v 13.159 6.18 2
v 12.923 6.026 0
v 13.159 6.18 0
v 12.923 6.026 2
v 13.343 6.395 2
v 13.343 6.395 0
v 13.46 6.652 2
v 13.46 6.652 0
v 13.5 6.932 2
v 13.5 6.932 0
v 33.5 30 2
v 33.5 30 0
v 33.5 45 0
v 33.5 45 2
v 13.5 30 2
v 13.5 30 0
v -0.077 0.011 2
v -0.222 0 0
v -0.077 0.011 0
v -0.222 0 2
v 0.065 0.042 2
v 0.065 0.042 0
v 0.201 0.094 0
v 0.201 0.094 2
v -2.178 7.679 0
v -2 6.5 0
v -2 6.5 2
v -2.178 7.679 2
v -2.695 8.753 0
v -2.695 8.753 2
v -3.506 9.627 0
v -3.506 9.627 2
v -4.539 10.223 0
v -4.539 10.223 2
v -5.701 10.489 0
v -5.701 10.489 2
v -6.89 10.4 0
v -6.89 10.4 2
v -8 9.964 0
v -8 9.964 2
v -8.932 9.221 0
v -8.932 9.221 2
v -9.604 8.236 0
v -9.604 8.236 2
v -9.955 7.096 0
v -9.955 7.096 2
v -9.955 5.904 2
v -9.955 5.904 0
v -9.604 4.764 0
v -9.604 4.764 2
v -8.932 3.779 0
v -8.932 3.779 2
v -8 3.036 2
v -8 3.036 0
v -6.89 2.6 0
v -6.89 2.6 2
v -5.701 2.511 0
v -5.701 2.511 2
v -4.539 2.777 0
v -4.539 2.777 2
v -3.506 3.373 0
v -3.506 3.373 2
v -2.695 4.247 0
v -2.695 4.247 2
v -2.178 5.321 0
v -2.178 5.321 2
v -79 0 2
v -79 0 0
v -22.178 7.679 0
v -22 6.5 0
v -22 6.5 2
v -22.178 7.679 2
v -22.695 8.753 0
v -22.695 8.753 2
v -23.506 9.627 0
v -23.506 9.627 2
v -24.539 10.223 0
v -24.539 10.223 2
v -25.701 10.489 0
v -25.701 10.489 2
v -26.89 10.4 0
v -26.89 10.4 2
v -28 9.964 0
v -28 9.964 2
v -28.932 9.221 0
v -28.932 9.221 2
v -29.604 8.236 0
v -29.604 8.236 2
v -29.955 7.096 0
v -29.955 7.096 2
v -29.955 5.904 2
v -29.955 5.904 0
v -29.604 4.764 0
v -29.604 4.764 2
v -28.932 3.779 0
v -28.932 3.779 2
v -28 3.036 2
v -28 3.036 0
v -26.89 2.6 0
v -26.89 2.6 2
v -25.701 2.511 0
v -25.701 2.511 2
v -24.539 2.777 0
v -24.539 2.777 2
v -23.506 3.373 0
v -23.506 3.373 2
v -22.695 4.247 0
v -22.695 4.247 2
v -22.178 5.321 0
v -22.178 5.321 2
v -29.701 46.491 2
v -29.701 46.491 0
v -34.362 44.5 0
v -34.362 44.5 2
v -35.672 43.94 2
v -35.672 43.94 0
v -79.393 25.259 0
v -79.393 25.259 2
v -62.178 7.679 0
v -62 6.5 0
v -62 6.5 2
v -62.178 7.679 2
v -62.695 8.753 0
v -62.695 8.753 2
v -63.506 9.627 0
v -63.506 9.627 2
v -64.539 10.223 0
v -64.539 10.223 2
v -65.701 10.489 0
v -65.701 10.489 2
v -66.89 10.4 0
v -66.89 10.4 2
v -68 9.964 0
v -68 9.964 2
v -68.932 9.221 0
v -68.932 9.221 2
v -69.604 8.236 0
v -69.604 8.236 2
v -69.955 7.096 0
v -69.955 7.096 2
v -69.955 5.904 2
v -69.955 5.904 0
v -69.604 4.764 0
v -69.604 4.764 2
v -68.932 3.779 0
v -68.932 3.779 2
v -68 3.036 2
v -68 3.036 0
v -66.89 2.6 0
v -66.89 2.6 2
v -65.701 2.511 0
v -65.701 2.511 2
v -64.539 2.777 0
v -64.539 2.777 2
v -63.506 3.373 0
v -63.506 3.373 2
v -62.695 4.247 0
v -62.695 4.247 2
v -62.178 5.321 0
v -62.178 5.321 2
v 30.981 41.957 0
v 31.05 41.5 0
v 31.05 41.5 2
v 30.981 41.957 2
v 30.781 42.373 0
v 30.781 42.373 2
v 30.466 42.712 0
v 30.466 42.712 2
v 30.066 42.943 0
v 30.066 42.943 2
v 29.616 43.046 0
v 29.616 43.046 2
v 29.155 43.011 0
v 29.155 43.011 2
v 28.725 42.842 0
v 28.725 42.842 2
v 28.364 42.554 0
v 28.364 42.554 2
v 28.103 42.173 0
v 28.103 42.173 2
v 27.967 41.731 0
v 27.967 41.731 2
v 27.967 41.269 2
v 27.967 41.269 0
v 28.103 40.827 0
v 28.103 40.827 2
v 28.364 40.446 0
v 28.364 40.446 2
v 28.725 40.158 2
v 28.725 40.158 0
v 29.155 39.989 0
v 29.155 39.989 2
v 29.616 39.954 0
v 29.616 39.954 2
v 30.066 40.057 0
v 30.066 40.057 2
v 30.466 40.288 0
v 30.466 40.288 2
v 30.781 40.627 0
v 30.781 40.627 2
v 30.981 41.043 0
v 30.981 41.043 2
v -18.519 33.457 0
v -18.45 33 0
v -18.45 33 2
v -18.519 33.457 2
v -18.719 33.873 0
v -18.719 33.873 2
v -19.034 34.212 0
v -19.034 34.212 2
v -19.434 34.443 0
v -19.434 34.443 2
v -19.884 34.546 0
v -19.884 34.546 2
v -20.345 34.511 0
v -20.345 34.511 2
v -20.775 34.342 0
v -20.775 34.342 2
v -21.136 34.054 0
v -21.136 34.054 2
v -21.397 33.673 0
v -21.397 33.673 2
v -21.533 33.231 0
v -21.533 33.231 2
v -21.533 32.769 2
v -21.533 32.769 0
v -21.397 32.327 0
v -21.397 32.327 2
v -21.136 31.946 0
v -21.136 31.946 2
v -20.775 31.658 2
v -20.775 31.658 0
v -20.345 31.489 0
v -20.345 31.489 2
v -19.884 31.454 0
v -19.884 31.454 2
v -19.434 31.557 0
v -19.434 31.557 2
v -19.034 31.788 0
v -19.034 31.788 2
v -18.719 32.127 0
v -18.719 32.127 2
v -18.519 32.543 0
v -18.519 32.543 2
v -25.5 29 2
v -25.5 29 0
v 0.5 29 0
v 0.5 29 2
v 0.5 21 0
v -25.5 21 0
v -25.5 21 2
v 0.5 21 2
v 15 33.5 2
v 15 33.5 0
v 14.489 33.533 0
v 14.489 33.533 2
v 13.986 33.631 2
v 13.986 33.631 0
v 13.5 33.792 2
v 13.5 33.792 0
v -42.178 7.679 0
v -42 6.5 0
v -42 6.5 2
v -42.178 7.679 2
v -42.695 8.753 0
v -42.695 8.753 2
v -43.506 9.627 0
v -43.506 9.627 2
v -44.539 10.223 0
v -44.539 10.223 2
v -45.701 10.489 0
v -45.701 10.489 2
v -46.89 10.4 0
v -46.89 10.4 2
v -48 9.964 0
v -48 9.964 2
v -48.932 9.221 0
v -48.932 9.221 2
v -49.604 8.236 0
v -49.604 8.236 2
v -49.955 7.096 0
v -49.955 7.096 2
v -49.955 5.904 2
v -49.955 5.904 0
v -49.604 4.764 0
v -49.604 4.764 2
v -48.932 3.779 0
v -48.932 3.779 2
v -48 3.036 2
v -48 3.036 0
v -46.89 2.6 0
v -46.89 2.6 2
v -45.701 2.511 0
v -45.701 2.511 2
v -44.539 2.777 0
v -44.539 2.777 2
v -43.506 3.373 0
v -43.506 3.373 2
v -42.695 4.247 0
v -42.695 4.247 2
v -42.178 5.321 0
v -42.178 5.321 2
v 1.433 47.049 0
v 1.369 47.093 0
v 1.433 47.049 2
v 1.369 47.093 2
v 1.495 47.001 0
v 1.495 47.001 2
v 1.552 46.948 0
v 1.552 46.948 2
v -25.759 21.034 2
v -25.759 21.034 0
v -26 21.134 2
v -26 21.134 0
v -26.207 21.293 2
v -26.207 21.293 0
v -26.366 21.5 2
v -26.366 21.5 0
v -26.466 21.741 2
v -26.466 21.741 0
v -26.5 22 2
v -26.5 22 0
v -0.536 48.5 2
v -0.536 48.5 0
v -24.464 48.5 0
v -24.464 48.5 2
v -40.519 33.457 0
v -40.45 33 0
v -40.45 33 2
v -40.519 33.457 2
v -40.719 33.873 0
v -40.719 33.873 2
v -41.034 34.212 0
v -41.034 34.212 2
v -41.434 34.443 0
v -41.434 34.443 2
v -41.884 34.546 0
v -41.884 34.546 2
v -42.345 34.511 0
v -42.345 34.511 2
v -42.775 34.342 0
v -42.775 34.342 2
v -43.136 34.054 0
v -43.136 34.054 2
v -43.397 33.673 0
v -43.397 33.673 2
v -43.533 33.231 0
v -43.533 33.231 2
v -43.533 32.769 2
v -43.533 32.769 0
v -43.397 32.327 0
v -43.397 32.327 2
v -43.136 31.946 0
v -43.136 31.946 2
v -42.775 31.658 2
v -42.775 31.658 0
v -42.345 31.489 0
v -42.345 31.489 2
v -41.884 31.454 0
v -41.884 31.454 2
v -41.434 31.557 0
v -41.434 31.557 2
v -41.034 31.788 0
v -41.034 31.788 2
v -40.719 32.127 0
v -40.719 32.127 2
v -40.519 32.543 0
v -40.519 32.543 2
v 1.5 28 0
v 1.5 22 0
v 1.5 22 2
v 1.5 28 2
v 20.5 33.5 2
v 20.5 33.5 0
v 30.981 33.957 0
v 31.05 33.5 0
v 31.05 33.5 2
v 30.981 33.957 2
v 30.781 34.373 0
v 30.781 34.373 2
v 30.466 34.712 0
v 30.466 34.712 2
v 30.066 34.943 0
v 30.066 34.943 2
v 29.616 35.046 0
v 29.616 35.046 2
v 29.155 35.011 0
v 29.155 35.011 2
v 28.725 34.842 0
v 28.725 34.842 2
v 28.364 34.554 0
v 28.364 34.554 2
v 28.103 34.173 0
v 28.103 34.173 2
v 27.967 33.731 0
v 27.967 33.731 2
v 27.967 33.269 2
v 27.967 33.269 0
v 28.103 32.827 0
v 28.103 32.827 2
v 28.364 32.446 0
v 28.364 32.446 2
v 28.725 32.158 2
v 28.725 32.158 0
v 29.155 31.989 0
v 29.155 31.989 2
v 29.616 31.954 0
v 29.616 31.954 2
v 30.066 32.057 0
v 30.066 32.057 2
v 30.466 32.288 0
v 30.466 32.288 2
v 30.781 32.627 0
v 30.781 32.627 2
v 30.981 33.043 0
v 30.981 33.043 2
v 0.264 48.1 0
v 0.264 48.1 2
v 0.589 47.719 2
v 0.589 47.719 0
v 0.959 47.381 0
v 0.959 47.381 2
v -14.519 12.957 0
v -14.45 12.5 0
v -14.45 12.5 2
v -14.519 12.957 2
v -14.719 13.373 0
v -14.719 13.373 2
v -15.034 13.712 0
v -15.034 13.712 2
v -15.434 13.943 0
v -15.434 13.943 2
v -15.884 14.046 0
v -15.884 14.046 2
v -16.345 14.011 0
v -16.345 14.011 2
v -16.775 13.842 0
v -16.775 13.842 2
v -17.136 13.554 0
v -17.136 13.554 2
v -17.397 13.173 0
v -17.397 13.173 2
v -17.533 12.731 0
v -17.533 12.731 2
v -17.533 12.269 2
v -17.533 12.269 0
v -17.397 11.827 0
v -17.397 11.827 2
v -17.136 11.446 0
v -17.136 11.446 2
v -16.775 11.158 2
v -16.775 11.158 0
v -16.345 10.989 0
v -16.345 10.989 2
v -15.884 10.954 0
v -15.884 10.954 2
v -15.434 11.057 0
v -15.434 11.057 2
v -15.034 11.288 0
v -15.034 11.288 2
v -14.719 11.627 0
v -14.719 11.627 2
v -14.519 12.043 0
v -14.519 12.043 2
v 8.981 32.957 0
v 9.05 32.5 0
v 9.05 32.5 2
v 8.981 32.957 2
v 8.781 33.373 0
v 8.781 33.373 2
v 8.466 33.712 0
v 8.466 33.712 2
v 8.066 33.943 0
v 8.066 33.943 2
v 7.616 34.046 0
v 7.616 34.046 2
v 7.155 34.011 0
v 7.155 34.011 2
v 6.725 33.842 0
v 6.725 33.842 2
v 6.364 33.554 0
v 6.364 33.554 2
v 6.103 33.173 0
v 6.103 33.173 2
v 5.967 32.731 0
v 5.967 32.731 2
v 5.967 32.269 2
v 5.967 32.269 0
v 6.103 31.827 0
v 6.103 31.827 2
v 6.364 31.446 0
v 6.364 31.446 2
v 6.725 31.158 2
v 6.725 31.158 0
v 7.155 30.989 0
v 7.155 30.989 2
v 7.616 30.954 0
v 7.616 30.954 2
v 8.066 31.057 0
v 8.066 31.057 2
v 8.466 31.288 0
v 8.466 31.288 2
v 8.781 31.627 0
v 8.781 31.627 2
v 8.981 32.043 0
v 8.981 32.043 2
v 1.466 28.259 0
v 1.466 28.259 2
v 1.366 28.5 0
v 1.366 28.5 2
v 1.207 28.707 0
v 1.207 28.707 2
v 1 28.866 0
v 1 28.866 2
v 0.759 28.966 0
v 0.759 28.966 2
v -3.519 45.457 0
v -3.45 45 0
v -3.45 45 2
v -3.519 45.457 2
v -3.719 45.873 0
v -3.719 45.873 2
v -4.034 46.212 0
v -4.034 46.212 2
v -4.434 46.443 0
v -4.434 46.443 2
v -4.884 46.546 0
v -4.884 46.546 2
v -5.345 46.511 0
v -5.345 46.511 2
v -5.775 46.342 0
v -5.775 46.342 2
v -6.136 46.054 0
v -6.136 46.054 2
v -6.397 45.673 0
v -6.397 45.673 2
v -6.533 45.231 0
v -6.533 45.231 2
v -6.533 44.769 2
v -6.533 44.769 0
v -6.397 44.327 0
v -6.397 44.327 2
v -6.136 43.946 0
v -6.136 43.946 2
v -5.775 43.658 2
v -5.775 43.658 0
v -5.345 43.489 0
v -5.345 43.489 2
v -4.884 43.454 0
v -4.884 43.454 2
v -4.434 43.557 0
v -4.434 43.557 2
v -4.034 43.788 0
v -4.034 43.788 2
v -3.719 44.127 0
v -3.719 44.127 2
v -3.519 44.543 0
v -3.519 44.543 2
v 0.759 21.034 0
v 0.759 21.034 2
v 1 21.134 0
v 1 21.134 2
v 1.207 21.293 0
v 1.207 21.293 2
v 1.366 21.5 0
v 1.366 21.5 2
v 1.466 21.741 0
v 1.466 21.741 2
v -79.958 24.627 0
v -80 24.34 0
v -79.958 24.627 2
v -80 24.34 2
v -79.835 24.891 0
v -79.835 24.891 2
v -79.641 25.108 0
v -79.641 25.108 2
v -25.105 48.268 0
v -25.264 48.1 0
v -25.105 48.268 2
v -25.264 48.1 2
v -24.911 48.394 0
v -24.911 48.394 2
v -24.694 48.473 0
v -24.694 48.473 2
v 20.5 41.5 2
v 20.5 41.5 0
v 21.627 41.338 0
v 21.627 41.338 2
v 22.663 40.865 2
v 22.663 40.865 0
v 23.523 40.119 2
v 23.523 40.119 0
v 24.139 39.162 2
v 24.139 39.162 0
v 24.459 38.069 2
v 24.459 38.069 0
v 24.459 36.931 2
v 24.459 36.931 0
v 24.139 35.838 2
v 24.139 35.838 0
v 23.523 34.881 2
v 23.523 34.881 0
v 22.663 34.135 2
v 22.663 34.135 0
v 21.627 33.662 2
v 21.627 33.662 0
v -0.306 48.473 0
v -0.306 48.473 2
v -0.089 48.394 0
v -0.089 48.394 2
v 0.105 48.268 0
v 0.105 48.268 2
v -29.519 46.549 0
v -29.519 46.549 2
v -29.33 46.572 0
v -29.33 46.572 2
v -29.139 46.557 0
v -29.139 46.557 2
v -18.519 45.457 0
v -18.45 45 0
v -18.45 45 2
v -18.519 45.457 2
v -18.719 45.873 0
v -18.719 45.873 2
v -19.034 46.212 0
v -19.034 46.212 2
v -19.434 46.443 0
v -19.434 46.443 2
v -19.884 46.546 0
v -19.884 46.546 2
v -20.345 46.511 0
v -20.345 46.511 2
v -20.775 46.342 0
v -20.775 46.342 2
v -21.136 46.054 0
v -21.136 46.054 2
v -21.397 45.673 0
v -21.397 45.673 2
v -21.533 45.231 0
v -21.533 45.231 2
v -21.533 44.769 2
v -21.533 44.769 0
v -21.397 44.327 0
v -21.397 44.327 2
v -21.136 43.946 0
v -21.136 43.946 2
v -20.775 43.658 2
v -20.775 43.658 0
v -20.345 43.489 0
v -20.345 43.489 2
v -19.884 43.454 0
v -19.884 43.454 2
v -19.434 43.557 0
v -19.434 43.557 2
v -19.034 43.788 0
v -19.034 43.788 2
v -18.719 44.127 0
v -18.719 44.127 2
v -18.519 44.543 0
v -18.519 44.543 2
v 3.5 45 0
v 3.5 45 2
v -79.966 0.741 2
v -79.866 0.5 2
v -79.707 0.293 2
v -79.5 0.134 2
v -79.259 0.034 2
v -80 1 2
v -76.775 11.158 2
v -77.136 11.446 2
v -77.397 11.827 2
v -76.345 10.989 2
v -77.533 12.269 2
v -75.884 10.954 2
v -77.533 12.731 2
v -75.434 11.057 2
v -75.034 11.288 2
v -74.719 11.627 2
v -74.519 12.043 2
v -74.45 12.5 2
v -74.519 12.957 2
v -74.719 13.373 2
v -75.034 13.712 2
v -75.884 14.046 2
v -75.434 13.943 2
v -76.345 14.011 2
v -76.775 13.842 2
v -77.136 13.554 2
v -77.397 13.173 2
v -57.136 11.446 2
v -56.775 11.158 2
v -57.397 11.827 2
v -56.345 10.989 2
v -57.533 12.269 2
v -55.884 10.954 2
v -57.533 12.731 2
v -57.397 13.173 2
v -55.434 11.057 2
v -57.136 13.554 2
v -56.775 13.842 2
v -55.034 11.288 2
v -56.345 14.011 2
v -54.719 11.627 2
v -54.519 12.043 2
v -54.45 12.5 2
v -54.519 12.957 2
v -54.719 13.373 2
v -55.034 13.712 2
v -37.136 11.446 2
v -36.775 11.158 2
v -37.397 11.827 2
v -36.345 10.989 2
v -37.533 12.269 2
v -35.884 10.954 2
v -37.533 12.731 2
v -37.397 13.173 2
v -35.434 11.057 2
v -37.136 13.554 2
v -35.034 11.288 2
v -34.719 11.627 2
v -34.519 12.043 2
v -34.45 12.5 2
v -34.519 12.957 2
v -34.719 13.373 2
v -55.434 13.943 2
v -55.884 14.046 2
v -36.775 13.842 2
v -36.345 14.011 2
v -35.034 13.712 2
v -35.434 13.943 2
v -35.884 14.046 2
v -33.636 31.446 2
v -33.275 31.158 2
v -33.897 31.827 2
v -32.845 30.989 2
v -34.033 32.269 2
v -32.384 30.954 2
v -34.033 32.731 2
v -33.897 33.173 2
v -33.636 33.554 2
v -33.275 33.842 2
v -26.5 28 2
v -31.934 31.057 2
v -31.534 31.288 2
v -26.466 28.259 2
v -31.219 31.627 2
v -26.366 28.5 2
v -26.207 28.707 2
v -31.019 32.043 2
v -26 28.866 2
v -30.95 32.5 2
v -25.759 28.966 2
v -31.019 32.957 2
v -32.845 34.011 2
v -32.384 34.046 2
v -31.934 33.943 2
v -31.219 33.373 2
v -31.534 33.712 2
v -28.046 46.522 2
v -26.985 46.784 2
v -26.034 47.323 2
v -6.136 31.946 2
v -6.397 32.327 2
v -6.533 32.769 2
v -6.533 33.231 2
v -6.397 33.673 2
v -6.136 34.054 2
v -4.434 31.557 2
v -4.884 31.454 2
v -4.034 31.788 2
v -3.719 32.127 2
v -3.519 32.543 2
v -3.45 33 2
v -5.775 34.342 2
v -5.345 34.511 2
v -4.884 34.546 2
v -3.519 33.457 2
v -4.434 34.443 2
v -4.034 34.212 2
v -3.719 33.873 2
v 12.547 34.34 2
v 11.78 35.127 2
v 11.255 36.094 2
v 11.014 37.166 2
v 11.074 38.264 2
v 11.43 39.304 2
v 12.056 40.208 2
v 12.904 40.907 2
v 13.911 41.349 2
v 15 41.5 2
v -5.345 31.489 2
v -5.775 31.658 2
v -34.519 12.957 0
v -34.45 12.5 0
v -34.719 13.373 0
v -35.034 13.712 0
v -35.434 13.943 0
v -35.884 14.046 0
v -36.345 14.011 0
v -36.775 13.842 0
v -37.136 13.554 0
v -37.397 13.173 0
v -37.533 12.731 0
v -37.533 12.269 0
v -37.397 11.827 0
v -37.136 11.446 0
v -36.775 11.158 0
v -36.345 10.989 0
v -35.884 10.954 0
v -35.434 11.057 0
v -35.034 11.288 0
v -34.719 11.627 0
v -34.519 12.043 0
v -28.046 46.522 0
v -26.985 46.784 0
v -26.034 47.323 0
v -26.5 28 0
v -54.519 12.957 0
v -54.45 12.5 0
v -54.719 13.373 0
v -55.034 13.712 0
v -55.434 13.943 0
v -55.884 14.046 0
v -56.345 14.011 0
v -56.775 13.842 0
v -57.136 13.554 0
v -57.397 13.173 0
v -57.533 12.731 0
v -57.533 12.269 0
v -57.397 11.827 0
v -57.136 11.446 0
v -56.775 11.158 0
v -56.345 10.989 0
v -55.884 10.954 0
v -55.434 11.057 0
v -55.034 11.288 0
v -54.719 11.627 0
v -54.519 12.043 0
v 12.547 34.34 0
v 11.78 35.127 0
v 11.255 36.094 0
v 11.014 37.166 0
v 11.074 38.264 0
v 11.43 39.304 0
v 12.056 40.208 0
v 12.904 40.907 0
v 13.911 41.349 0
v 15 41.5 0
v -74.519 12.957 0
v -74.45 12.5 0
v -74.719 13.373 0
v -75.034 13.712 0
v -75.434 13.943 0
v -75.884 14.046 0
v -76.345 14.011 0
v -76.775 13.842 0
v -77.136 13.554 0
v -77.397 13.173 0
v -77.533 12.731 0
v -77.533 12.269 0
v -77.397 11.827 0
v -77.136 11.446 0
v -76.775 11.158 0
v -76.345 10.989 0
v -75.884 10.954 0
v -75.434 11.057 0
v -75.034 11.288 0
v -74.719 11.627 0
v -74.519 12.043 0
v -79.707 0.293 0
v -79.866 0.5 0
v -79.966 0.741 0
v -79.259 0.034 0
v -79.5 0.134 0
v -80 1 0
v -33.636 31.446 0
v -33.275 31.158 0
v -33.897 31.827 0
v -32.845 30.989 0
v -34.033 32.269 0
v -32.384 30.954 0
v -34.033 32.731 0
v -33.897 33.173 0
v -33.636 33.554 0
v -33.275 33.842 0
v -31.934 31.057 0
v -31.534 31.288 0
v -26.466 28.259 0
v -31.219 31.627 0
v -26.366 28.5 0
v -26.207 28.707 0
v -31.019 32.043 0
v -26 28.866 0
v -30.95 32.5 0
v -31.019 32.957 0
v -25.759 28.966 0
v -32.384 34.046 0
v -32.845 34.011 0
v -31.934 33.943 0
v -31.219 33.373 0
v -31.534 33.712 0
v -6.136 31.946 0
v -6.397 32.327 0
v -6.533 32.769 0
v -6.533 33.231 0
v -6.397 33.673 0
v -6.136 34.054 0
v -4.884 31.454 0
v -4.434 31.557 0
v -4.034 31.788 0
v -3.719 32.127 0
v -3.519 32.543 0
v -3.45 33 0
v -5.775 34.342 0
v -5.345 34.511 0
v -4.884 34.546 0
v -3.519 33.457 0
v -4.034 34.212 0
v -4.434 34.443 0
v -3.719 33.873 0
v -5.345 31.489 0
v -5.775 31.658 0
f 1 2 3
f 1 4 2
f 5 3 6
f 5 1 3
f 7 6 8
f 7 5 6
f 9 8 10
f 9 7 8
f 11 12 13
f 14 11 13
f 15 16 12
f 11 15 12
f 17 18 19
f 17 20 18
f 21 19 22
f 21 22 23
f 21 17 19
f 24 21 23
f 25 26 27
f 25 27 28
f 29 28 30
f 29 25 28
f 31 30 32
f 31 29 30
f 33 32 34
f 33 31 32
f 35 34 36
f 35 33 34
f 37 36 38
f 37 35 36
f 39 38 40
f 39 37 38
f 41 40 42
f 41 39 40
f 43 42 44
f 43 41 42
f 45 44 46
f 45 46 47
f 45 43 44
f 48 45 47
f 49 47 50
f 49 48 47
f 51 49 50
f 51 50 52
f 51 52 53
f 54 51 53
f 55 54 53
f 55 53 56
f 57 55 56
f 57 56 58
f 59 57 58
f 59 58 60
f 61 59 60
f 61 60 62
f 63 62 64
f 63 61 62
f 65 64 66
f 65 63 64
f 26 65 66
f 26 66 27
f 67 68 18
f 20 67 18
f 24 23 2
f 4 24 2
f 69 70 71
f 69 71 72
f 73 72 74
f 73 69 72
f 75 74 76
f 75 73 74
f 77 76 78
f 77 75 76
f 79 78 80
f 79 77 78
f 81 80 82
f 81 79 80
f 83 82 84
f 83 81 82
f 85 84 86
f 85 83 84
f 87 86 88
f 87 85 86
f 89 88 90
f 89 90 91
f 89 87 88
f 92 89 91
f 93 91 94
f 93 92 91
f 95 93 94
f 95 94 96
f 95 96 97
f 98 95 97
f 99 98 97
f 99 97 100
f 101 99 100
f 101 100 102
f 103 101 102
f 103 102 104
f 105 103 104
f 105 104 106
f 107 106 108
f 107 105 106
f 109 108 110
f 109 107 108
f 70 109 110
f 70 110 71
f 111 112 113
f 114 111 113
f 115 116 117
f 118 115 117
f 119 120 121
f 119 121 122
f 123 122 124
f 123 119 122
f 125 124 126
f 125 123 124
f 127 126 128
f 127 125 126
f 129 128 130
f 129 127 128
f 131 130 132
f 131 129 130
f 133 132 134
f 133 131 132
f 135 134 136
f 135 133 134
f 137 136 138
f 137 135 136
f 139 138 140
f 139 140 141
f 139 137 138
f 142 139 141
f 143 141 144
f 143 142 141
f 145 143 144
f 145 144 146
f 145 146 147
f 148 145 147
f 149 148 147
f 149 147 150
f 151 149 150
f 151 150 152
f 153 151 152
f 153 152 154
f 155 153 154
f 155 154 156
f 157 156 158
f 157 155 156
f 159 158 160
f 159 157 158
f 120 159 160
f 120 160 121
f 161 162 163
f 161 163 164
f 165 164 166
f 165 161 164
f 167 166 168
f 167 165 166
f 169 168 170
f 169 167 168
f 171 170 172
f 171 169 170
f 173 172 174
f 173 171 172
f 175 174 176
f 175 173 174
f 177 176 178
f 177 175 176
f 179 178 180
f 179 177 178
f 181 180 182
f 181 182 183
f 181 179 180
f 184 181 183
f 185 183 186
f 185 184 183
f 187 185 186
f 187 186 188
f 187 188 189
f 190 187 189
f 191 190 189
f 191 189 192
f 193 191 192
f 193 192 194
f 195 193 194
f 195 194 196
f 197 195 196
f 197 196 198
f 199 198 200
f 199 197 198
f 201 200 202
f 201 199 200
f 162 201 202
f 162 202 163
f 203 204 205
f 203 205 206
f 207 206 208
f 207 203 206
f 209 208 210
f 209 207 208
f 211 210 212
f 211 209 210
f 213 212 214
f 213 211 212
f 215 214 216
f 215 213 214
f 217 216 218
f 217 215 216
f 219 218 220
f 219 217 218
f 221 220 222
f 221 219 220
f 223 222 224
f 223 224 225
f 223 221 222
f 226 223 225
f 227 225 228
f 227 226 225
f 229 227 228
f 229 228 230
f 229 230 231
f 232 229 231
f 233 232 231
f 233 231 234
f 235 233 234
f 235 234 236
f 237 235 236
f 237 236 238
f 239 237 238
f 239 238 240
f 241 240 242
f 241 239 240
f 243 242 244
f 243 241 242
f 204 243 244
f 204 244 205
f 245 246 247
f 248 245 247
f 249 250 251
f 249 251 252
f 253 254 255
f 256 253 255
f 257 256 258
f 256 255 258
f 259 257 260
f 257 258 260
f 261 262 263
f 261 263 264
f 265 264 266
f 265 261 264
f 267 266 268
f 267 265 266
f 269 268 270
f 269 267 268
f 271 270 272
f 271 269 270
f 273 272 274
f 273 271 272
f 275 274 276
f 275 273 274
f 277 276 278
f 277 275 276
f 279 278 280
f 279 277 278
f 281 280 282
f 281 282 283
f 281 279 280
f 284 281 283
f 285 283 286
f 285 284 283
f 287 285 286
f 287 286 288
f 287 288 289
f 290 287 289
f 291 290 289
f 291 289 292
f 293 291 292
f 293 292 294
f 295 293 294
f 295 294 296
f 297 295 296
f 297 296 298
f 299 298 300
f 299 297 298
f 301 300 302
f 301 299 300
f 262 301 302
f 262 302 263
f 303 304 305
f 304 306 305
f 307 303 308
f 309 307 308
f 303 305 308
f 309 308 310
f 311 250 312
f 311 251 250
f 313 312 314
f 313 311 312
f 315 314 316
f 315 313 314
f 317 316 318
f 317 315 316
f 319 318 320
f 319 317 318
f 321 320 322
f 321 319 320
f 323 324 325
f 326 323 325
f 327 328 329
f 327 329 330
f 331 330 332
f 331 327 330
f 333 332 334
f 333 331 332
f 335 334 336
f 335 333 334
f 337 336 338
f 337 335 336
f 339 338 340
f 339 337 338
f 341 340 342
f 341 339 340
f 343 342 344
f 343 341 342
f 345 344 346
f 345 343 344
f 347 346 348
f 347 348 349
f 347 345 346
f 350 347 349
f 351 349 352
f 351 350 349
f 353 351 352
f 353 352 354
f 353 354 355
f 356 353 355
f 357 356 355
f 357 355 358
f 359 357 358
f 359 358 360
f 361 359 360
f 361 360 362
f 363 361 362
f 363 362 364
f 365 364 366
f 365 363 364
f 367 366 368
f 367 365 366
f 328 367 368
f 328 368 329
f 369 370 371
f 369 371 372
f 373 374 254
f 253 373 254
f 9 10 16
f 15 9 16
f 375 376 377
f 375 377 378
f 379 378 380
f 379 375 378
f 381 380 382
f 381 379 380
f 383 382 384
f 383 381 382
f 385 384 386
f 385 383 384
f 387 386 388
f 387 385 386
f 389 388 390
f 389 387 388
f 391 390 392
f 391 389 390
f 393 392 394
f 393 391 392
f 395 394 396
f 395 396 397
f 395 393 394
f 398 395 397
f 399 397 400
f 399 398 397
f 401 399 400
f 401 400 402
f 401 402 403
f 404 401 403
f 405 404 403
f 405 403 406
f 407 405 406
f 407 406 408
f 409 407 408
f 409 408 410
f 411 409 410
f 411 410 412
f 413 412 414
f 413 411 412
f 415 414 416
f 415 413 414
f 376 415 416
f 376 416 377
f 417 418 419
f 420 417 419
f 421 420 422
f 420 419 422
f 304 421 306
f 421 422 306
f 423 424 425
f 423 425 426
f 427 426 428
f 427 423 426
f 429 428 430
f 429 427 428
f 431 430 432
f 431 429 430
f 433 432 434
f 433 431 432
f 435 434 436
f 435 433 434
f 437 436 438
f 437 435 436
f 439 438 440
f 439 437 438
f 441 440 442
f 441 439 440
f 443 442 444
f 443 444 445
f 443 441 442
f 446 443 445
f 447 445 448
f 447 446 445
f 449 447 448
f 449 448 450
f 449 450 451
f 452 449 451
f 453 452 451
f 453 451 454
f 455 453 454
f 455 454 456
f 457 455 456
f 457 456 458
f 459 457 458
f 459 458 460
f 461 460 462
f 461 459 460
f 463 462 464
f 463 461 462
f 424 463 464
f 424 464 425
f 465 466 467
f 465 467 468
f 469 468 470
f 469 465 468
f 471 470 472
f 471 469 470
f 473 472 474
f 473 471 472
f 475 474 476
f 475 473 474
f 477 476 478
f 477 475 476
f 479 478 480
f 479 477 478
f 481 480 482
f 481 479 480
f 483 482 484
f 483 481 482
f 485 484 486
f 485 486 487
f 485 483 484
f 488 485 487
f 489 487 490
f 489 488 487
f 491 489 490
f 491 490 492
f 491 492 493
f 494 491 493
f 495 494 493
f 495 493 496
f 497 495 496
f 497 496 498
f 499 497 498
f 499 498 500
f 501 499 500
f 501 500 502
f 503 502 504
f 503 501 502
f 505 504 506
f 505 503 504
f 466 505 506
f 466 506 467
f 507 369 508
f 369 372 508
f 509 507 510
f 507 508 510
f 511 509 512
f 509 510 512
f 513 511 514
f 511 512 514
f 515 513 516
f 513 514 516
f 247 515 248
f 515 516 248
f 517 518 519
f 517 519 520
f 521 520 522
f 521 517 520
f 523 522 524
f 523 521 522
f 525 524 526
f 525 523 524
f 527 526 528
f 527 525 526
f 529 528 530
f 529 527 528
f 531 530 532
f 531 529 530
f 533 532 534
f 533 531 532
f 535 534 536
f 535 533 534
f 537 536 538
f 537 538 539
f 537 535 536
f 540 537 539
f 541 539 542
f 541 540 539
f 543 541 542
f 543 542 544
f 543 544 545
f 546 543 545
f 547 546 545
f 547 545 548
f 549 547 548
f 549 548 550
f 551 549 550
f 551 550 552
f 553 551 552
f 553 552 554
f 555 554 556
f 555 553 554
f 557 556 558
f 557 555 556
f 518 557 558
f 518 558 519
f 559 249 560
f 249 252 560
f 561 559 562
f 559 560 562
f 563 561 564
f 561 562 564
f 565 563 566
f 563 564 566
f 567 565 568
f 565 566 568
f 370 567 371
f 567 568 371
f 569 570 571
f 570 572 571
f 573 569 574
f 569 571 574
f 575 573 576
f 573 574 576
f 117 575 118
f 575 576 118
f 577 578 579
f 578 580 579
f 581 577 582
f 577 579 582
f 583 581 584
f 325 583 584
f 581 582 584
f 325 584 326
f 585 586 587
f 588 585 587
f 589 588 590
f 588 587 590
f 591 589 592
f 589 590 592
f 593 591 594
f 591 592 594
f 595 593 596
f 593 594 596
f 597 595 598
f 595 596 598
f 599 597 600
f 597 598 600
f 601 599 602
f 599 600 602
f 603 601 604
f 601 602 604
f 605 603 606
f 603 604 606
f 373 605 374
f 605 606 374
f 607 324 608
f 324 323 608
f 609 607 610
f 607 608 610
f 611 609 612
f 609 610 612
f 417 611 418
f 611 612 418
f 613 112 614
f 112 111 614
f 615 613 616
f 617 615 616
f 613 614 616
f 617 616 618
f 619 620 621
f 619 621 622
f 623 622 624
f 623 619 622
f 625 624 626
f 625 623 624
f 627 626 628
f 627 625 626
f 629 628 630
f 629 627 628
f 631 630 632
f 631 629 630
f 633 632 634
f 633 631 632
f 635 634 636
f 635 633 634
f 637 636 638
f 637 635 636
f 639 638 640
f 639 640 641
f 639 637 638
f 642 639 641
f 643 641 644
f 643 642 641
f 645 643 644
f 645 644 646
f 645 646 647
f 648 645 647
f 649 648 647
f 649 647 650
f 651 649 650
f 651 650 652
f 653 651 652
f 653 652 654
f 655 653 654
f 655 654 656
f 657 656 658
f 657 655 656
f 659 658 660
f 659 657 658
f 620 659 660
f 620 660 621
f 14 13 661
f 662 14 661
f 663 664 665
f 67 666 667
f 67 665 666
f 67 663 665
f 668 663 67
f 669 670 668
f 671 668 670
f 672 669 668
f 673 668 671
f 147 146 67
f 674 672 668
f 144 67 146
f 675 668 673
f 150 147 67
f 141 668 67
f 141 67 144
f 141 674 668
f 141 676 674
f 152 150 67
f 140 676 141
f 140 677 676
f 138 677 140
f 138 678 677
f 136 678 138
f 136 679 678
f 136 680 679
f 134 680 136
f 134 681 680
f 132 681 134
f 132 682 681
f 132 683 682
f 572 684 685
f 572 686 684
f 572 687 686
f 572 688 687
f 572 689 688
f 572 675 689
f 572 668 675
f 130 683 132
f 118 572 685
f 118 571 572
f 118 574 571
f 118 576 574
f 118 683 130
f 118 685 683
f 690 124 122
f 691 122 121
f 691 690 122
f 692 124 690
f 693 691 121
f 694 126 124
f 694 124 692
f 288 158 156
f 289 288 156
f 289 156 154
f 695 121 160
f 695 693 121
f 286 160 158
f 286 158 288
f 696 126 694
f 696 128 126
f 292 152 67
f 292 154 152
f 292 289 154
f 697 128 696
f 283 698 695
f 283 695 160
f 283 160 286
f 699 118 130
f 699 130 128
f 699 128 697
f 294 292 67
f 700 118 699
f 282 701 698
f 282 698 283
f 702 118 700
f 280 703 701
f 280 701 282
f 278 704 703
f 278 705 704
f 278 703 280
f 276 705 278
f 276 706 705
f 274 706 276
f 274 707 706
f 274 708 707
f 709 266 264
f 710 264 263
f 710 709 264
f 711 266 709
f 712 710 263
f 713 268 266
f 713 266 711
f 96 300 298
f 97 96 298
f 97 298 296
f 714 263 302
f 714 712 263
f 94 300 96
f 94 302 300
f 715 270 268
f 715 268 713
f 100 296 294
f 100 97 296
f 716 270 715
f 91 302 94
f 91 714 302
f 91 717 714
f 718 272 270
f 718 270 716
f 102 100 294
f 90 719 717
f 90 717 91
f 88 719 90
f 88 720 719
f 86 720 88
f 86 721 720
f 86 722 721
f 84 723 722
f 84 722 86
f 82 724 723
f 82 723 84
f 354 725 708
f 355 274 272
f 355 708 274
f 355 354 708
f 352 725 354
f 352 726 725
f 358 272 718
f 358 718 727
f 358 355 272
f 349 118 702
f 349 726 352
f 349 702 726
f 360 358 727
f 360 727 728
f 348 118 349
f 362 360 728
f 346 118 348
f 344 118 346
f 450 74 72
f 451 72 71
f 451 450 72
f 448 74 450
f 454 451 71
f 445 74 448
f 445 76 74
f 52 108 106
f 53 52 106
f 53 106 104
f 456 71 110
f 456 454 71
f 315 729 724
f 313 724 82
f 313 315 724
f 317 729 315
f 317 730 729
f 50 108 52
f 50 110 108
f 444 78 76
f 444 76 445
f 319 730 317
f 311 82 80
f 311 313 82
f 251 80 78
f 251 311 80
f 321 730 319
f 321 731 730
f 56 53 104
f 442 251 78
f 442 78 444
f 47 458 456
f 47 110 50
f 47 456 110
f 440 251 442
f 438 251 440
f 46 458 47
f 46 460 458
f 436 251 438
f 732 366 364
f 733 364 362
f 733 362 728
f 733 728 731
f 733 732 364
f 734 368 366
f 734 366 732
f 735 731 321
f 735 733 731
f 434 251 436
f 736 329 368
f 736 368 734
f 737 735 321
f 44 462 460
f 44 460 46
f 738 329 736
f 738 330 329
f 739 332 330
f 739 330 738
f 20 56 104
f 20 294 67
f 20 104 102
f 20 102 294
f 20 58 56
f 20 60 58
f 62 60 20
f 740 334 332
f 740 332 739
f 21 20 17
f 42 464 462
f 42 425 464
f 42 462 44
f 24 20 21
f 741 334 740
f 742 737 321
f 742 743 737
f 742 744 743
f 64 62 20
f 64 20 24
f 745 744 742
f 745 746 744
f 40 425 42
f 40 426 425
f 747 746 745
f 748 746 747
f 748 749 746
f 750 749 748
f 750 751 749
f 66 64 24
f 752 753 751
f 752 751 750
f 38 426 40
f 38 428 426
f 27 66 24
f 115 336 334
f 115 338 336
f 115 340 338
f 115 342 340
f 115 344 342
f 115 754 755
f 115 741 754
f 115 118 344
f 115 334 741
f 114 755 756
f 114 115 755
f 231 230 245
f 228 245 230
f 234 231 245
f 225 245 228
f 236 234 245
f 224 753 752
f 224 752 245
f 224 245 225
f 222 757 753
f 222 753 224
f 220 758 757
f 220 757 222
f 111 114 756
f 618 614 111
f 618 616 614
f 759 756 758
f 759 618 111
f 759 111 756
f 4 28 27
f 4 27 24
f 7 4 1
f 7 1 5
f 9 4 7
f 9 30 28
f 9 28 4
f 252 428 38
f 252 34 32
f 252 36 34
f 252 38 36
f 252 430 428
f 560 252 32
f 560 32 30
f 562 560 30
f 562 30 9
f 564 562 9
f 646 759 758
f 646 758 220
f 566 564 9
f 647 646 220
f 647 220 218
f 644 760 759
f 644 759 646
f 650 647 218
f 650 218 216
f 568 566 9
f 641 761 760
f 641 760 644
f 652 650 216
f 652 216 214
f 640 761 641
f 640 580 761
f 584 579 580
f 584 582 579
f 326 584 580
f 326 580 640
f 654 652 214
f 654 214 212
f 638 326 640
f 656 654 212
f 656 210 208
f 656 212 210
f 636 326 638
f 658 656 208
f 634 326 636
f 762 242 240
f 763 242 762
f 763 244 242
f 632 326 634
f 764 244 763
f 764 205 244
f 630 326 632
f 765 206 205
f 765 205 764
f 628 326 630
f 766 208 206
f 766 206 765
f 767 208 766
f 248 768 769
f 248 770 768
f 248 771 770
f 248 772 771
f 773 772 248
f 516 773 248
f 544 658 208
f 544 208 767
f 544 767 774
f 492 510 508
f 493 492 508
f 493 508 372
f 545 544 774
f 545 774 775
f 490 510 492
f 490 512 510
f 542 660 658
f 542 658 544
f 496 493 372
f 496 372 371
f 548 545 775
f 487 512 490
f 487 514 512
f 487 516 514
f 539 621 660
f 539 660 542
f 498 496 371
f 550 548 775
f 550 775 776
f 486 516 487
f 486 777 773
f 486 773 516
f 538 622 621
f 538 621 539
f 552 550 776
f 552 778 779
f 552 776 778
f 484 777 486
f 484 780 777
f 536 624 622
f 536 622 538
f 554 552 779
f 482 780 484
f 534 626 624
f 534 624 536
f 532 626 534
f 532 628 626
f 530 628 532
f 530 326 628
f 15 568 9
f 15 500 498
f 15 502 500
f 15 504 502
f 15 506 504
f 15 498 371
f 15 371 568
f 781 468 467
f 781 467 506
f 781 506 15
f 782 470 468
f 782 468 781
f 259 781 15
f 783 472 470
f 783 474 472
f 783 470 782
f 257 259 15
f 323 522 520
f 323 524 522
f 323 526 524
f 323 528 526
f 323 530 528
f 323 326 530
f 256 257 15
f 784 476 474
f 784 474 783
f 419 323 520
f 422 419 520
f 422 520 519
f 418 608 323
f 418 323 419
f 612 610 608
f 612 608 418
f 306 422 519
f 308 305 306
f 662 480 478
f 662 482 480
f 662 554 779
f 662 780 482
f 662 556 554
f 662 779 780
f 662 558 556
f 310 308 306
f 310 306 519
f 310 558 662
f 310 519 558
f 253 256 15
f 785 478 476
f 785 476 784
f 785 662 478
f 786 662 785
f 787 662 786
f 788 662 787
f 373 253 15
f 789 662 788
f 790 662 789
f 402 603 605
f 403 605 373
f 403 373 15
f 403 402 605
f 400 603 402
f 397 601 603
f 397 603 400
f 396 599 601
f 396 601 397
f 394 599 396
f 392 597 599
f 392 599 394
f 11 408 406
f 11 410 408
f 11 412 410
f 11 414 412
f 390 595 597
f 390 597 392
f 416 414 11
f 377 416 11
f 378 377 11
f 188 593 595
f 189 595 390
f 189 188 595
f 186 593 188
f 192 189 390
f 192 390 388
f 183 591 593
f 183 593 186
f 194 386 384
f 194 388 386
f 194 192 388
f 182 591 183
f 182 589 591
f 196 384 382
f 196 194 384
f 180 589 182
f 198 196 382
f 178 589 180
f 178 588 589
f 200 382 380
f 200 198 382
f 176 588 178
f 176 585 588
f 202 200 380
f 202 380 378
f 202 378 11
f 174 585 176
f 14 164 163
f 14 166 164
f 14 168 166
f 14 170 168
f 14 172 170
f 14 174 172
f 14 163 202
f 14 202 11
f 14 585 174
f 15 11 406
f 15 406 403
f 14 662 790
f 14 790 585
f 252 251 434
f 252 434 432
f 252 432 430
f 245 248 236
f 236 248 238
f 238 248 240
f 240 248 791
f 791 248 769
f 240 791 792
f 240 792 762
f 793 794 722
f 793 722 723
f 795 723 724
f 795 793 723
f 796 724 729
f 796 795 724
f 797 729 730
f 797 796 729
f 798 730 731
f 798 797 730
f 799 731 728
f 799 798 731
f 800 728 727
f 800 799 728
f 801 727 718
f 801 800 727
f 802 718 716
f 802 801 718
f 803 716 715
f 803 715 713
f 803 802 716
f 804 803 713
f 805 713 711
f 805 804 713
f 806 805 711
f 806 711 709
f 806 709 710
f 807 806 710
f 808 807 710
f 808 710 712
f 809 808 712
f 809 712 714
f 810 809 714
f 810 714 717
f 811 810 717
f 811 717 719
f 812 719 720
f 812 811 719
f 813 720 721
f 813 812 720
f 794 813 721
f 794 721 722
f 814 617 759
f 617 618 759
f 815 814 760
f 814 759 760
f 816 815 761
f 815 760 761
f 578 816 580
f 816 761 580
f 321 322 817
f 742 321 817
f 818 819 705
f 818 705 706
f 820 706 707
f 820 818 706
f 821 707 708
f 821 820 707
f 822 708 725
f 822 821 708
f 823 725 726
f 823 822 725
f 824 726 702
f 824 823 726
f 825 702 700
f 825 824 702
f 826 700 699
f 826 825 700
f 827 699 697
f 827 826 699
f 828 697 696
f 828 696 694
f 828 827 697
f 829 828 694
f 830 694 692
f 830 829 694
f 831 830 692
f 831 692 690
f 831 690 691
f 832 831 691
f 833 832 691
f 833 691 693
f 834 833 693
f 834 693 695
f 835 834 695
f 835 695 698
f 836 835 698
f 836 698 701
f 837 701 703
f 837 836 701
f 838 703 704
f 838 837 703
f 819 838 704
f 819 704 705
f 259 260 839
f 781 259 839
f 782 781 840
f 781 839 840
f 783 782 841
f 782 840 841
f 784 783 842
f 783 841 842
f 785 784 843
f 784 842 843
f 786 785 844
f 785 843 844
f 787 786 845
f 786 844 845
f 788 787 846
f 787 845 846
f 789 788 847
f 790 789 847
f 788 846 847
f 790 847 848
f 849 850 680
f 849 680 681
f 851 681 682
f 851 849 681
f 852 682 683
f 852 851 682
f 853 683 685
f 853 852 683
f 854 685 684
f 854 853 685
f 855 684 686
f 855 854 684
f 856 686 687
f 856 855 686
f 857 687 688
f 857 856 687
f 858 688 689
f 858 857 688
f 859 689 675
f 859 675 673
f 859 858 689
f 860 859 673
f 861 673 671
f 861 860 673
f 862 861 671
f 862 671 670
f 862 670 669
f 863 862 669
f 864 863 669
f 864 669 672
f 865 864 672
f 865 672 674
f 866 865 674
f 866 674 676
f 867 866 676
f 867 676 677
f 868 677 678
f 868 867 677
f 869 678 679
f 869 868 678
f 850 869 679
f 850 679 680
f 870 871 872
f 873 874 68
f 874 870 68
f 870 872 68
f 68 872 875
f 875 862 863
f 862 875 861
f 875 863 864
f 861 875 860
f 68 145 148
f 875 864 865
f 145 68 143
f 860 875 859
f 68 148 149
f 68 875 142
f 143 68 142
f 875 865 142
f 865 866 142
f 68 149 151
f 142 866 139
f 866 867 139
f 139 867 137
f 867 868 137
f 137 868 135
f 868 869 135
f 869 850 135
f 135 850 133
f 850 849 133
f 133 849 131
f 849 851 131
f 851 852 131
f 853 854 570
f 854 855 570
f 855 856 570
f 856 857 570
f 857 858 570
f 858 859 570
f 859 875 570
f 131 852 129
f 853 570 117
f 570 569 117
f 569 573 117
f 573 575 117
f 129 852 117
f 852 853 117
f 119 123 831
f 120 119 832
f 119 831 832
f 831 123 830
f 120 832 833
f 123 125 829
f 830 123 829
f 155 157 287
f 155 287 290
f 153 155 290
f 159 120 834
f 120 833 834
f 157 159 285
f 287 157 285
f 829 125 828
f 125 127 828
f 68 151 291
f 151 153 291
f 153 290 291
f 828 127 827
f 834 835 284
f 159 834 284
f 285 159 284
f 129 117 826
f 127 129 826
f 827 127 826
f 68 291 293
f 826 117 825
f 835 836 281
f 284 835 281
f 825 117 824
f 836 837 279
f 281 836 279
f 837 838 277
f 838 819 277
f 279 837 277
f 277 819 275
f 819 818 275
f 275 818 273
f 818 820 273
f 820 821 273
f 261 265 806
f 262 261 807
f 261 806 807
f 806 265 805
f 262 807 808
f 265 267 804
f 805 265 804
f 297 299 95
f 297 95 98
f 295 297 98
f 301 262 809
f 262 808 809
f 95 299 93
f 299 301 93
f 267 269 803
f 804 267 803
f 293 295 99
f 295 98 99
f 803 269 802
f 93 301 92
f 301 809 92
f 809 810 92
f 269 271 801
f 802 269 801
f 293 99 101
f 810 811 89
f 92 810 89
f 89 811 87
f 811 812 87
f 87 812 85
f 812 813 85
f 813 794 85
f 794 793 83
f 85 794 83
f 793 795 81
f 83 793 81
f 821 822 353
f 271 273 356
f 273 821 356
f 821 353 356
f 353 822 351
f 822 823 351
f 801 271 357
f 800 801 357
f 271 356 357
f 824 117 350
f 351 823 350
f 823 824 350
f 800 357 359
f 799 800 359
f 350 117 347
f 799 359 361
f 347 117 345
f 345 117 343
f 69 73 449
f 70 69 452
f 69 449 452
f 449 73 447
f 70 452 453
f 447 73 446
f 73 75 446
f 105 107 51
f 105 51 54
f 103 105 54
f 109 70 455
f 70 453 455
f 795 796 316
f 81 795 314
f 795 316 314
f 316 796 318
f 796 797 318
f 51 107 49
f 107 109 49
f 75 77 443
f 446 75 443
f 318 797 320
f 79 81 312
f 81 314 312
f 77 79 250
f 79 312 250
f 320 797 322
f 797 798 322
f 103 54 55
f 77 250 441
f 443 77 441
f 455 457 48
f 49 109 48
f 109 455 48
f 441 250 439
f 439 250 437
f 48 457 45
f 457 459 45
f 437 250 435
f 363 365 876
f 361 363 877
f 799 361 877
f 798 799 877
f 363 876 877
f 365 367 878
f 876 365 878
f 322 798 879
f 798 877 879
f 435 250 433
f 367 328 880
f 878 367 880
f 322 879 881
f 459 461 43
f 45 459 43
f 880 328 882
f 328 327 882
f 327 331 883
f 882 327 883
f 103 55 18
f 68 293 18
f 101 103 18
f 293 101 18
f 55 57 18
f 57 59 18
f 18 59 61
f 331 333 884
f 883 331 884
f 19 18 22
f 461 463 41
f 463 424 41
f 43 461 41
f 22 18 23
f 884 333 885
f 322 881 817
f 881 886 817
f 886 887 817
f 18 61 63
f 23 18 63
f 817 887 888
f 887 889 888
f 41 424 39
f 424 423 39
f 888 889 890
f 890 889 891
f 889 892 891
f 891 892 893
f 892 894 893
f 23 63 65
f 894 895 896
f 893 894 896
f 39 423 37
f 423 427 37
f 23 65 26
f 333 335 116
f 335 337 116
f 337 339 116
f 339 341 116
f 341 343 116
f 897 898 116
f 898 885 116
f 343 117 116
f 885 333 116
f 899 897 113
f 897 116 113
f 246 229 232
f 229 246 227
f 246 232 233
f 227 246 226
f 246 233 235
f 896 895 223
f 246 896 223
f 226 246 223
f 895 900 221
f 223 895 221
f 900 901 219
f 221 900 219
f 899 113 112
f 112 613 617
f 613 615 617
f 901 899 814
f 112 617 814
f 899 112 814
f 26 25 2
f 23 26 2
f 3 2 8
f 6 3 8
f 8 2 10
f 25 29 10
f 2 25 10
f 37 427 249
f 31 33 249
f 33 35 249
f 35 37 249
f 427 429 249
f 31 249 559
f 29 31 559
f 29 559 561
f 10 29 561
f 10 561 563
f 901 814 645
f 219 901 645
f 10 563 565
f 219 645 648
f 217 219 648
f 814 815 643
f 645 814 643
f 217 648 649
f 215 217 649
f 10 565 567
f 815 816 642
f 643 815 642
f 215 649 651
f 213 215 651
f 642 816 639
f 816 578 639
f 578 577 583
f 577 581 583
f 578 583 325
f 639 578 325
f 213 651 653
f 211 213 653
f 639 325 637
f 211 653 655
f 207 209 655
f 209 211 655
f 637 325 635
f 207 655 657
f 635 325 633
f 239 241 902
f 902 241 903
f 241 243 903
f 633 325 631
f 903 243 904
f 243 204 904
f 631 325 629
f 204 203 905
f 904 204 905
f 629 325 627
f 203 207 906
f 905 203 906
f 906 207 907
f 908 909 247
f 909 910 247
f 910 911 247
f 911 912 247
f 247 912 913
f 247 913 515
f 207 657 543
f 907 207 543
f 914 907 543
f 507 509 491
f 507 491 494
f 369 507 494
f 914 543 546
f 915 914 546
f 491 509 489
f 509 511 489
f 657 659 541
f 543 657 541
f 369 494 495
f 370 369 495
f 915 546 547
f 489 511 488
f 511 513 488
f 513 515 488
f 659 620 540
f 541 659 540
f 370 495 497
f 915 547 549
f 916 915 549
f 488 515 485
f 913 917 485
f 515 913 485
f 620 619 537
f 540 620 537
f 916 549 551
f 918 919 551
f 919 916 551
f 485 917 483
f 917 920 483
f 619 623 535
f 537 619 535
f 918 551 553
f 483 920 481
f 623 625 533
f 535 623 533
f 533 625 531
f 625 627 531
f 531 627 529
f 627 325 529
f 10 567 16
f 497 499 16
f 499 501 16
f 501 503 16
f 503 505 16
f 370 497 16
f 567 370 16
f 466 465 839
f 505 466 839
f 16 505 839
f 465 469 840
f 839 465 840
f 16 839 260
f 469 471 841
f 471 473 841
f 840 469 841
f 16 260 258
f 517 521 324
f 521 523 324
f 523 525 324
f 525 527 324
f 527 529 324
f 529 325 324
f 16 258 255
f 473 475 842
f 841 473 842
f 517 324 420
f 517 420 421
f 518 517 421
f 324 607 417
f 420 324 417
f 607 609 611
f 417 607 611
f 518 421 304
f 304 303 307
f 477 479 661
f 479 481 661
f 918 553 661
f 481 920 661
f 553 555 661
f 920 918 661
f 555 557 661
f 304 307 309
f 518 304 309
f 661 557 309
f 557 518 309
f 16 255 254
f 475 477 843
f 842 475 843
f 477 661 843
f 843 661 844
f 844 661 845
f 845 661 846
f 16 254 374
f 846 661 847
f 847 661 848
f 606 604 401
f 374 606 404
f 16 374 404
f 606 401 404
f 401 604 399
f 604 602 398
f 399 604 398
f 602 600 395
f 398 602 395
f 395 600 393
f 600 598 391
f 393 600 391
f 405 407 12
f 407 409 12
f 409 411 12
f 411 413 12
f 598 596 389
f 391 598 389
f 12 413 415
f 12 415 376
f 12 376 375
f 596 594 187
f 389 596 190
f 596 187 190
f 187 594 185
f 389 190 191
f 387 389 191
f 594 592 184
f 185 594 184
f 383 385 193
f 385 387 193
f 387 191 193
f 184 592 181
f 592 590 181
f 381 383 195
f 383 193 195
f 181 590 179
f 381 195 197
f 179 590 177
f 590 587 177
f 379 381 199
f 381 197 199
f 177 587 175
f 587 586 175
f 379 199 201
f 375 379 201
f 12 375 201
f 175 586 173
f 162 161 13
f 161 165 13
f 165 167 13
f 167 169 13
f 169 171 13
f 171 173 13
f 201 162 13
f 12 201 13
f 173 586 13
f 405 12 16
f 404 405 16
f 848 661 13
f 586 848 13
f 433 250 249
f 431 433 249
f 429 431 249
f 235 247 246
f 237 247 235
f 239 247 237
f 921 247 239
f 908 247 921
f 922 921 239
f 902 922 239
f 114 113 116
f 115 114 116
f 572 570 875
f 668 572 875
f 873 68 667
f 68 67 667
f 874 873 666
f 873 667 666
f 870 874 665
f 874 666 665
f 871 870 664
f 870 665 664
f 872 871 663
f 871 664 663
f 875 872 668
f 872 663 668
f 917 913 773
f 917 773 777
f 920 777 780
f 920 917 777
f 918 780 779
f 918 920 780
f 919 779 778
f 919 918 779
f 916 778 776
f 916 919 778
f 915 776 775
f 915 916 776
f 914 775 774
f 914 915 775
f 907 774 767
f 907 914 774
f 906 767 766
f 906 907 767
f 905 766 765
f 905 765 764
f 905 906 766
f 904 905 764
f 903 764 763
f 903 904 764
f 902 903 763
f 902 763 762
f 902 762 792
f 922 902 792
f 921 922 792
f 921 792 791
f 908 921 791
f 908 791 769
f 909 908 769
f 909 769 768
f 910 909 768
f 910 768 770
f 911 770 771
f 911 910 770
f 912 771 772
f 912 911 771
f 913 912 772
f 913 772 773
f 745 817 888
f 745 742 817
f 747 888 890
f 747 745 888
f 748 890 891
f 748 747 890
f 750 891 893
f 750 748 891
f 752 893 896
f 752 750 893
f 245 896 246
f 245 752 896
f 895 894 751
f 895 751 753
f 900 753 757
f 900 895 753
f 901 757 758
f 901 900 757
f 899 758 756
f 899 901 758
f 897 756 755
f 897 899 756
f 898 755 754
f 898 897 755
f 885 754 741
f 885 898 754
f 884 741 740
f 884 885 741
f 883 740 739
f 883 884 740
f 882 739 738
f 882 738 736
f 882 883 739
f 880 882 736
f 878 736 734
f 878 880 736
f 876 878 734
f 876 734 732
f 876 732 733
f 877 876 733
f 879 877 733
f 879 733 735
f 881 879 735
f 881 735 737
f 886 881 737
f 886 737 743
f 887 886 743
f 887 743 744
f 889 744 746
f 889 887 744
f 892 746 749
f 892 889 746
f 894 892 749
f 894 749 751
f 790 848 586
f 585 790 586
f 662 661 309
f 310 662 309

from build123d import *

# Parameters (mm, degrees)
SKETCH_1_R          = 4
SKETCH_1_R_2        = 1.55
SKETCH_1_W          = 28
SKETCH_1_H          = 8
EXTRUDE_1_DEPTH     = 2
SKETCH_2_R          = 4
CUT_EXTRUDE_1_DEPTH = 10
FILLET_2_R          = 1


with BuildPart() as part:
    # 草图1 → 凸台-拉伸1 (new body)
    with BuildSketch(Plane.XY):
        Polygon((-80, 0), (0, 0), (13.5, 6.295153385), (13.5, 30), (33.5, 30), (33.5, 45), (3.5, 45), (0, 48.5), (-25, 48.5), (-34.361702128, 44.5), (-35.671585242, 43.940322669), (-80, 25), align=None)
        with Locations((-66, 6.5)):
            Circle(SKETCH_1_R, mode=Mode.SUBTRACT)
        with Locations((-46, 6.5)):
            Circle(SKETCH_1_R, mode=Mode.SUBTRACT)
        with Locations((-76, 12.5)):
            Circle(SKETCH_1_R_2, mode=Mode.SUBTRACT)
        with Locations((-56, 12.5)):
            Circle(SKETCH_1_R_2, mode=Mode.SUBTRACT)
        with Locations((-36, 12.5)):
            Circle(SKETCH_1_R_2, mode=Mode.SUBTRACT)
        with Locations((-26, 6.5)):
            Circle(SKETCH_1_R, mode=Mode.SUBTRACT)
        with Locations((-6, 6.5)):
            Circle(SKETCH_1_R, mode=Mode.SUBTRACT)
        with Locations((-16, 12.5)):
            Circle(SKETCH_1_R_2, mode=Mode.SUBTRACT)
        with Locations((-42, 33)):
            Circle(SKETCH_1_R_2, mode=Mode.SUBTRACT)
        with Locations((-32.5, 32.5)):
            Circle(SKETCH_1_R_2, mode=Mode.SUBTRACT)
        with Locations((-12.5, 25)):
            Rectangle(SKETCH_1_W, SKETCH_1_H, mode=Mode.SUBTRACT)
        with Locations((-20, 33)):
            Circle(SKETCH_1_R_2, mode=Mode.SUBTRACT)
        with Locations((-5, 33)):
            Circle(SKETCH_1_R_2, mode=Mode.SUBTRACT)
        with Locations((7.5, 32.5)):
            Circle(SKETCH_1_R_2, mode=Mode.SUBTRACT)
        with Locations((29.5, 33.5)):
            Circle(SKETCH_1_R_2, mode=Mode.SUBTRACT)
        with Locations((-20, 45)):
            Circle(SKETCH_1_R_2, mode=Mode.SUBTRACT)
        with Locations((-5, 45)):
            Circle(SKETCH_1_R_2, mode=Mode.SUBTRACT)
        with BuildLine():
            ThreePointArc((13.5, 33.791900756), (11.07365329, 38.26406905), (15, 41.5))
            Line((15, 41.5), (20.5, 41.5))
            ThreePointArc((20.5, 41.5), (24.5, 37.5), (20.5, 33.5))
            Line((20.5, 33.5), (15, 33.5))
            ThreePointArc((15, 33.5), (14.23593095, 33.57365329), (13.5, 33.791900756))
        make_face(mode=Mode.SUBTRACT)
        with Locations((29.5, 41.5)):
            Circle(SKETCH_1_R_2, mode=Mode.SUBTRACT)
    extrude(amount=EXTRUDE_1_DEPTH)

    # 草图2 → 切除-拉伸1 (cut)
    with BuildSketch(Plane.XY.offset(2)):
        with Locations((3.464101615, 50.5)):
            Circle(SKETCH_2_R)
        with Locations((-28.464101615, 50.5)):
            Circle(SKETCH_2_R)
    extrude(amount=-CUT_EXTRUDE_1_DEPTH, mode=Mode.SUBTRACT)

    # 圆角2
    fillet_2_edges = [part.edges().sort_by_distance(p)[0] for p in [
        (1.464101615, 47.035898385, 1),
        (-29.413394303, 46.614276979, 1),
        (1.5, 21, 1),
        (1.5, 29, 1),
        (-26.5, 29, 1),
        (-26.5, 21, 1),
        (13.5, 6.295153385, 1),
        (0, 0, 1),
        (-80, 0, 1),
        (-80, 25, 1),
        (-25, 48.5, 1),
        (0, 48.5, 1),
    ]]
    fillet(fillet_2_edges, radius=FILLET_2_R)


solid = part.part
